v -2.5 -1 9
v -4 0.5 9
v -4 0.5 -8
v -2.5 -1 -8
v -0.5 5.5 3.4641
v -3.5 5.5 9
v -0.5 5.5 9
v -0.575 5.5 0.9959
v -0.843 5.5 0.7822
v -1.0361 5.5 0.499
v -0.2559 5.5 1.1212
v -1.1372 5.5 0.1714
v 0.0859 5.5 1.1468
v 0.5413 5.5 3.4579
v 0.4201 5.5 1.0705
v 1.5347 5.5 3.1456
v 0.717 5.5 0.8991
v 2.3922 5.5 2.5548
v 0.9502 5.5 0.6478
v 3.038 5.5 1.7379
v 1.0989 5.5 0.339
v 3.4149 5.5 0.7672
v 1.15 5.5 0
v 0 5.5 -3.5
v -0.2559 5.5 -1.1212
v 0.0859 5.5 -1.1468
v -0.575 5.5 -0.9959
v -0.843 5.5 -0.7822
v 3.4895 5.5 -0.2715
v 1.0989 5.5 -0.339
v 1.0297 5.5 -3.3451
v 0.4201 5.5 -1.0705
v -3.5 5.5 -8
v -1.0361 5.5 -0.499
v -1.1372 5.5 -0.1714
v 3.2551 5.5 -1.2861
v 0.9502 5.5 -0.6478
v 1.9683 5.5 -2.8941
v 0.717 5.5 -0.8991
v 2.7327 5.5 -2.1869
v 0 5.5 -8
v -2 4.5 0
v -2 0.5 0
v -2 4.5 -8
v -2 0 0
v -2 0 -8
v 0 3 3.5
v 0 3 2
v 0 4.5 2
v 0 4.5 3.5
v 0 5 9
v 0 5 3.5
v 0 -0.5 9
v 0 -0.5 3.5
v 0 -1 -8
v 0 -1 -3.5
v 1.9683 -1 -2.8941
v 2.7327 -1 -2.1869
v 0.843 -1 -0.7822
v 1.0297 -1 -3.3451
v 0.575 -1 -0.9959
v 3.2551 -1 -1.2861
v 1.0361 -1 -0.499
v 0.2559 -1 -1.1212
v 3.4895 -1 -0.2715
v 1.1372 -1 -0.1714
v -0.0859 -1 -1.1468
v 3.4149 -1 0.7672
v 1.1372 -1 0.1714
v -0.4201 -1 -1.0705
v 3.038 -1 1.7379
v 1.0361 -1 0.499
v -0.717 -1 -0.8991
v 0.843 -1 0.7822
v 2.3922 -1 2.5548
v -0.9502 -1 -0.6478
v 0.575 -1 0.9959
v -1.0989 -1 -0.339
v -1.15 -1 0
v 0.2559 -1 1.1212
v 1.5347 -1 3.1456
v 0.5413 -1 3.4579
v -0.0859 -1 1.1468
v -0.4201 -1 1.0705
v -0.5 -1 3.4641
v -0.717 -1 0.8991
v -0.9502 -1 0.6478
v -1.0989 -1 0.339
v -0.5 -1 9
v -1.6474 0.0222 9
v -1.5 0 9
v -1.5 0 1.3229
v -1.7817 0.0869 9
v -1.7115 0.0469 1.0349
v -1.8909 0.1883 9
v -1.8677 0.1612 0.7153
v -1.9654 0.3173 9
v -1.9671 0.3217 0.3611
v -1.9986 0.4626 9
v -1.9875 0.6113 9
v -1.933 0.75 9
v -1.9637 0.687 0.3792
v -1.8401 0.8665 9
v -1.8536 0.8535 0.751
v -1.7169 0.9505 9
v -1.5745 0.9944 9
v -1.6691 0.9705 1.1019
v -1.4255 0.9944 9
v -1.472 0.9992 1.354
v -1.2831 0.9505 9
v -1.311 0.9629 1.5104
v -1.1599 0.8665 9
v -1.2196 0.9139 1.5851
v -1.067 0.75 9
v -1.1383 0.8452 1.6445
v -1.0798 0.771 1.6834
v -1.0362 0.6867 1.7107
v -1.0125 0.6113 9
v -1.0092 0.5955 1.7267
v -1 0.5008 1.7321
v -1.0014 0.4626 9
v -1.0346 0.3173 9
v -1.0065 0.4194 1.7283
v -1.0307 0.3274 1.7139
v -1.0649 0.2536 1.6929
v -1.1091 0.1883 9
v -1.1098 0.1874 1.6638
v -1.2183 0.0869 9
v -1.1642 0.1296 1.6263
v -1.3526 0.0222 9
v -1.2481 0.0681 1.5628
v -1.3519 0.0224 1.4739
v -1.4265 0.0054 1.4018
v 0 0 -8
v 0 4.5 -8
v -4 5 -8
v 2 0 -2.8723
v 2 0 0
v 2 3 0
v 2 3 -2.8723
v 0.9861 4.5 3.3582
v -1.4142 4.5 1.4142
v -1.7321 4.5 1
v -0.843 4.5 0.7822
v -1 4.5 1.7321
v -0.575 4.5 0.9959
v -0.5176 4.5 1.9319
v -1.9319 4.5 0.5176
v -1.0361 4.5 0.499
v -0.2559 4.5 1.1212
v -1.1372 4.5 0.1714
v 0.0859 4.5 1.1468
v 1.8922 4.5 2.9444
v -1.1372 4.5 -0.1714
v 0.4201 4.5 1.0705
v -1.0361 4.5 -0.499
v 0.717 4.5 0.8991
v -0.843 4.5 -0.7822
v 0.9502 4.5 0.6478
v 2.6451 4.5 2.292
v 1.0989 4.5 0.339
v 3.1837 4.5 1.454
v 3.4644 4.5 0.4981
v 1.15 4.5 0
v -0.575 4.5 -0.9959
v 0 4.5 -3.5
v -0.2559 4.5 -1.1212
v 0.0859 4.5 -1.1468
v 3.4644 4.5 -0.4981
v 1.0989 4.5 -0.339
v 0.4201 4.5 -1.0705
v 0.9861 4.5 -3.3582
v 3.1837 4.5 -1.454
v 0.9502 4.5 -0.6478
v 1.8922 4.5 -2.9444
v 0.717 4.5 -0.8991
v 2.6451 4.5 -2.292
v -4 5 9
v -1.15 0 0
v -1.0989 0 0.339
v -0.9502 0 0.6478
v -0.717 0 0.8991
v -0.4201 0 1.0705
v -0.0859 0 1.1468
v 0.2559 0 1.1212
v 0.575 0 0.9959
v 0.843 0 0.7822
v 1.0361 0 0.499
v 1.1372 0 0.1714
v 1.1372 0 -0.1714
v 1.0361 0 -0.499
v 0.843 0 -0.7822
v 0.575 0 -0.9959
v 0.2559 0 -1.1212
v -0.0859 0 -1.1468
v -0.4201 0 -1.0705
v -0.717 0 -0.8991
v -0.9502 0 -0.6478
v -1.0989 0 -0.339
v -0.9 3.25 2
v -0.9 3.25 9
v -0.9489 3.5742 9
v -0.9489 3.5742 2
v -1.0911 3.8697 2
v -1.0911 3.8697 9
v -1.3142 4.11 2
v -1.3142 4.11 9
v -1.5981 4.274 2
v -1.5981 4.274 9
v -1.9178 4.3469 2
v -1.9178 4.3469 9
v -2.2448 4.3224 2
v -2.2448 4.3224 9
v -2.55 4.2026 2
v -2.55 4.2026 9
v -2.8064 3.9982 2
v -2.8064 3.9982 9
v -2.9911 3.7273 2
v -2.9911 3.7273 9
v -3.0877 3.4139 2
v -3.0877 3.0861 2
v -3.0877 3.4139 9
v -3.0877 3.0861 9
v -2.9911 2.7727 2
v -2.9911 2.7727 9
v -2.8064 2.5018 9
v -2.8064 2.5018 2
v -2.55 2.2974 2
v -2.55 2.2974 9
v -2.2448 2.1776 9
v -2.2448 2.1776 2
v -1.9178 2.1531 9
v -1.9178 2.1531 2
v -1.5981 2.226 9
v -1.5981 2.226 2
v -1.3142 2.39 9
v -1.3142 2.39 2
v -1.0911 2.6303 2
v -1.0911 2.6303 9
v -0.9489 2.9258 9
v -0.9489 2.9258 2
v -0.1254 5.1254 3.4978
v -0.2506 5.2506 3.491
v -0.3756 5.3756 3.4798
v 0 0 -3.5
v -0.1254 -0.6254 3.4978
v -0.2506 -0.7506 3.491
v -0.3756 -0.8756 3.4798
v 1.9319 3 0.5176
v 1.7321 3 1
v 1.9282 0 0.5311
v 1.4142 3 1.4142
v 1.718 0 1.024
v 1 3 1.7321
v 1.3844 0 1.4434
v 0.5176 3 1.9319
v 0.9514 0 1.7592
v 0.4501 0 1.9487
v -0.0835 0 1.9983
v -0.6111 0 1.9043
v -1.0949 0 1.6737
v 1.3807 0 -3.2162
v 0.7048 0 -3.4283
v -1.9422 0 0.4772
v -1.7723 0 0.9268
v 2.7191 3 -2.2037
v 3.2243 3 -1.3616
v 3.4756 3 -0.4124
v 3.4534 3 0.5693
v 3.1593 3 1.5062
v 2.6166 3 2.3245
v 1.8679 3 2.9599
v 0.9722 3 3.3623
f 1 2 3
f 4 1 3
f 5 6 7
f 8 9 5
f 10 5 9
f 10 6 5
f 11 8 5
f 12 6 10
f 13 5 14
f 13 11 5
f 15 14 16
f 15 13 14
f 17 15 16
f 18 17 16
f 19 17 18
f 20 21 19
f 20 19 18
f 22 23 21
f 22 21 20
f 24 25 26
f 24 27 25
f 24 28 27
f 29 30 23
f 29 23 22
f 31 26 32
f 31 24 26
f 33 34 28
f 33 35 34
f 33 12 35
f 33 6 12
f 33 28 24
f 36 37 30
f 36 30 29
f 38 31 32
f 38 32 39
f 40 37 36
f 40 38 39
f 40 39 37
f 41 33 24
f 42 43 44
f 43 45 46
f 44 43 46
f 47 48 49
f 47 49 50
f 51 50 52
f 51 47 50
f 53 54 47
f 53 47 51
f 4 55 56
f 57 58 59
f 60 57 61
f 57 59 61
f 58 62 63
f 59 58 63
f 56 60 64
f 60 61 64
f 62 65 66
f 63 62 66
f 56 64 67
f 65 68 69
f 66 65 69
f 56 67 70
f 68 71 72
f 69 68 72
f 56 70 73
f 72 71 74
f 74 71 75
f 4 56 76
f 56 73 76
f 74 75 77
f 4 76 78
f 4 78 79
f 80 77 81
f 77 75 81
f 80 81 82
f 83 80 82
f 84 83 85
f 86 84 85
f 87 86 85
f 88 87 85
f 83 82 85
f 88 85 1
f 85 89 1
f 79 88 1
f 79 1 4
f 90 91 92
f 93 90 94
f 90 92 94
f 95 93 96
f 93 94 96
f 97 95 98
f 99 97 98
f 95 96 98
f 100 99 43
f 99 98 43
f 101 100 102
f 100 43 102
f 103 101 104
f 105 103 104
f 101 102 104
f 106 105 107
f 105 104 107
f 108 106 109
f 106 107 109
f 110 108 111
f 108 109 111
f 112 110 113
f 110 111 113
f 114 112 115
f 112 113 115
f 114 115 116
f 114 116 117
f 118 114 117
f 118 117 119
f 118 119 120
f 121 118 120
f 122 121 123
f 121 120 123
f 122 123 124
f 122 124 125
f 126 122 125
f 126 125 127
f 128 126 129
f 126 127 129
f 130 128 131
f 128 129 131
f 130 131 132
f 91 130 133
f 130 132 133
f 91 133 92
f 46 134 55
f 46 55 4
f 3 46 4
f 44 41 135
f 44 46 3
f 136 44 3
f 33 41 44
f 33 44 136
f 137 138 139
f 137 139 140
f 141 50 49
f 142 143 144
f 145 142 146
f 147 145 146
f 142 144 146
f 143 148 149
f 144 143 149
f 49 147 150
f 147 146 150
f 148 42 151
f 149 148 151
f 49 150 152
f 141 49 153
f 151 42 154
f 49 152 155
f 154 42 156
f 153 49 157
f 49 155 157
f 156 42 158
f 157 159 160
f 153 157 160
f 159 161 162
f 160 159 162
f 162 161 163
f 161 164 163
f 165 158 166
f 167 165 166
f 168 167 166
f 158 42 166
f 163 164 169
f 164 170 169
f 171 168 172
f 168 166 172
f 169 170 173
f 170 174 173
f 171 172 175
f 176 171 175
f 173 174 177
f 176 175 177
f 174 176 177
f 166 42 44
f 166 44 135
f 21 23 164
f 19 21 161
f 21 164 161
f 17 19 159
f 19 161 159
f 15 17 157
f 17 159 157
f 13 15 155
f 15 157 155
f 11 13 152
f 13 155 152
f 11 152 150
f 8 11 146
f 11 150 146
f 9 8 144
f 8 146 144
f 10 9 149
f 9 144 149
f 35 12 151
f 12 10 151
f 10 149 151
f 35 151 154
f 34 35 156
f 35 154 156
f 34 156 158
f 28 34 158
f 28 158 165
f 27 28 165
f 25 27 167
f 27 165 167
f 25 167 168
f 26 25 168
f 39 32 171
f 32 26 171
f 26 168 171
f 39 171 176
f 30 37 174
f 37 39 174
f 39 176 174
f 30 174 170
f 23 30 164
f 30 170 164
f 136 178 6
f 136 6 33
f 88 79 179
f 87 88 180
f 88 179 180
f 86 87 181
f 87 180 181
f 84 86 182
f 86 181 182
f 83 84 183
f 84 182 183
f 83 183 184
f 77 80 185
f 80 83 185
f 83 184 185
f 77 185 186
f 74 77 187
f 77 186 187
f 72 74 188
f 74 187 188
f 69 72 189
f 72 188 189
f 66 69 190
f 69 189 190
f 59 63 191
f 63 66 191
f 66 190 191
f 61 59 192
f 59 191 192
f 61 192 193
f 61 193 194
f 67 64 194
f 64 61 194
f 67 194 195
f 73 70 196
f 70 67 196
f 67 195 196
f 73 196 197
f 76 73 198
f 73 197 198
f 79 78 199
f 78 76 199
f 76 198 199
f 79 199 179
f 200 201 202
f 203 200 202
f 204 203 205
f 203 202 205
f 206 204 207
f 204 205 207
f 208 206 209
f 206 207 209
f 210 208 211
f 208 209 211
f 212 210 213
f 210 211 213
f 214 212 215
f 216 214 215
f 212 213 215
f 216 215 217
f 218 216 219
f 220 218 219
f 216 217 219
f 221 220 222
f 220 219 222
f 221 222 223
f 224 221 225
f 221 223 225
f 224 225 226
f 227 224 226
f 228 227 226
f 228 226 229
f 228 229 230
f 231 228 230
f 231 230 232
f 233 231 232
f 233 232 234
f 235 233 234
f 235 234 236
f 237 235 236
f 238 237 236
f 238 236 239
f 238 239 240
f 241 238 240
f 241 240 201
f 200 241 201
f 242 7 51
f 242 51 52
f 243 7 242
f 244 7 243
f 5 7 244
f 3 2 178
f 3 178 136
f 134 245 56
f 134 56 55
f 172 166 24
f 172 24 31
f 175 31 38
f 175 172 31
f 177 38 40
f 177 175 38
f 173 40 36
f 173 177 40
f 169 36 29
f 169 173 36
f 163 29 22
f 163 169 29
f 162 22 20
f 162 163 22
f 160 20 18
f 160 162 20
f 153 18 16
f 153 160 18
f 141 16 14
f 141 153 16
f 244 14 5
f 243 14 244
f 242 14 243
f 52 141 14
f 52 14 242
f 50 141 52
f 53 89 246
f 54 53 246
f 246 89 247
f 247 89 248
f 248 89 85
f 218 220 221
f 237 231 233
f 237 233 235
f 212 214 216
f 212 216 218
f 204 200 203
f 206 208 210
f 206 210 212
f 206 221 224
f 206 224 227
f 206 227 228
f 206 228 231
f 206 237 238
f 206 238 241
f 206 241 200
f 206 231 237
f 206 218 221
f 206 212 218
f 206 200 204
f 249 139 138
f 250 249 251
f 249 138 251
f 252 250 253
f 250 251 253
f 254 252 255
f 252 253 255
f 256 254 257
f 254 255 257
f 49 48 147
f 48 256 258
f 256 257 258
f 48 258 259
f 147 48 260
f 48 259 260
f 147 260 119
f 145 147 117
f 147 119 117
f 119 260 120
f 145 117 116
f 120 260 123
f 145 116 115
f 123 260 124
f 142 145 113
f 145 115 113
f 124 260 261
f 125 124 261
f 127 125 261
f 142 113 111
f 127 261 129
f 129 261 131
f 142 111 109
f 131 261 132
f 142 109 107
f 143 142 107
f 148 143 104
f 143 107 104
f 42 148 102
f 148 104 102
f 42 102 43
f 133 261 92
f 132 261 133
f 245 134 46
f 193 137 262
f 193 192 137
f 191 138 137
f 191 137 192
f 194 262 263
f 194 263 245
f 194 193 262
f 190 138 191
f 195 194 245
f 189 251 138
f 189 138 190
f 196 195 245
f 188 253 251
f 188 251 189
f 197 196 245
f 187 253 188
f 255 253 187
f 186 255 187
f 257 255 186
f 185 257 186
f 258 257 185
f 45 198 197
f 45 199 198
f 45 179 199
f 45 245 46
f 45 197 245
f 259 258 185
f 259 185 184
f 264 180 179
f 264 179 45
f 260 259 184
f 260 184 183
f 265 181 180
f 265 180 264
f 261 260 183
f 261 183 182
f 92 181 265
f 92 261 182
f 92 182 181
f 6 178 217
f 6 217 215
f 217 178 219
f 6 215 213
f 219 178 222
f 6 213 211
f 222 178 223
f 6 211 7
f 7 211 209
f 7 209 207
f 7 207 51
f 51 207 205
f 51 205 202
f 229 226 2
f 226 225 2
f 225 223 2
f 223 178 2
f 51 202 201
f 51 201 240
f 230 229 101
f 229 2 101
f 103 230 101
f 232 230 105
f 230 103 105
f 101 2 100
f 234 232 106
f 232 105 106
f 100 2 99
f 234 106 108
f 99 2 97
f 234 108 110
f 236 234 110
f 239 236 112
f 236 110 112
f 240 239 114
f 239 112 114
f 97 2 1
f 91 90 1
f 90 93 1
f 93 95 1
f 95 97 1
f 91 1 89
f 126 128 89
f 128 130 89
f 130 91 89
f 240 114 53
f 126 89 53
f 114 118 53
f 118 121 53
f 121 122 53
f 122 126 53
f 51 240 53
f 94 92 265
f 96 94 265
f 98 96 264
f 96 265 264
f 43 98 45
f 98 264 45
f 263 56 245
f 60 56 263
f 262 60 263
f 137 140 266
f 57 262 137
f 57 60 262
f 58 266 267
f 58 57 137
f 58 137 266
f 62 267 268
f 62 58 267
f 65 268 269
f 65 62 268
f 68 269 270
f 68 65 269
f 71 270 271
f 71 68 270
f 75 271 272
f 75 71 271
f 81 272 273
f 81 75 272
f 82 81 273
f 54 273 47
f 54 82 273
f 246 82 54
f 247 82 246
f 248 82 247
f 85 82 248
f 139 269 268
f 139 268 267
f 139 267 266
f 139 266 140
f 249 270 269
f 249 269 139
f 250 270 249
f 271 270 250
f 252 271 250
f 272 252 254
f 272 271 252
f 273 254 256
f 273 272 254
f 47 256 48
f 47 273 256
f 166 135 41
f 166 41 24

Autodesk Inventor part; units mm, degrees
ref_plane "YZ Plane" through (0, 0, 0) normal (1, 0, 0) x (0, 1, 0)
ref_plane "XZ Plane" through (0, 0, 0) normal (0, 1, 0) x (-1, 0, 0)
ref_plane "XY Plane" through (0, 0, 0) normal (0, 0, 1) x (1, 0, 0)
sketch "スケッチ1" plane through (0, 0, 0) normal (0, 1, 0) x (-1, 0, 0)
  circle A0 centre (0, 0) radius 1.15
  circle A1 centre (0, 0) radius 2
  circle A2 centre (0, 0) radius 3.5
  line L0 (0, 0) -> (0, 3.5)
  line L1 (2, 0) -> (-2, 0)
  line L2 (2, 0) -> (2, -2.8723)
  line L3 (-2, 0) -> (-2, -2.8723)
  line L4 (0, 2) -> (3.5, 2)
  line L5 (3.5, 2) -> (3.5, 6)
  line L6 (3.5, 6) -> (0, 6)
  line L7 (0, 6) -> (0, 2)
  line L8 (0, 6) -> (3.5, 6)
  line L9 (3.5, 6) -> (3.5, 0)
  line L10 (3.5, 0) -> (0, 0)
  line L11 (0, 0) -> (0, 6)
  line L12 (0, 0) -> (0, -8)
  line L13 (0, 0) -> (3.5, 0)
  line L14 (3.5, 0) -> (3.5, -8)
  line L15 (3.5, -8) -> (0, -8)
  line L16 (0, -8) -> (0, 0)
  line L17 (2, -2.8723) -> (2, -8)
  line L18 (0, -8) -> (3.5, -4.5)
  line L19 (0, -8) -> (4.9497, -8) construction
  line L20 (0, 0) -> (3.5, 0)
  line L21 (3.5, 0) -> (3.5, -9)
  line L22 (3.5, -9) -> (0, -9)
  line L23 (0, -9) -> (0, 0)
  line L24 (0, 2) -> (4, 2)
  line L25 (4, 2) -> (4, 9)
  line L26 (4, 9) -> (0, 9)
  line L27 (0, 9) -> (0, 2)
  line L28 (0, 9) -> (4, 9)
  line L29 (4, 9) -> (4, -9)
  line L30 (4, -9) -> (0, -9)
  line L31 (0, -9) -> (0, 9)
  line L32 (0, 0) -> (2, 0)
  line L33 (2, 0) -> (2, -9)
  line L34 (2, -9) -> (0, -9)
  line L35 (0, -9) -> (0, 0)
  point P0 (2, -6)
  point P1 (0, -3.5)
  dimension "d0" = 2.3
  dimension "d1" = 4
  dimension "d2" = 7
  dimension "d3" = 3.5
  dimension "d4" = 4
  dimension "d5" = 8
  dimension "d6" = 45
  dimension "d40" = 9
  dimension "d41" = 4
  dimension "d42" = 7
extrude "押し出し1" add sketch "スケッチ1" along normal blind 3 contours A1 L3 A2 L0
extrude "押し出し2" add sketch "スケッチ1" along normal blind 4.5 contours L10 A2 L2 | A1 L4 A2 L10 | L0 A2 L4 | A2 L14 L18 L17 | A2 L4 L9 | L9 L24 L29 L30 L21 L14 | L7 L6 L5 L4 A2 | L18 L14 L15 L17 | L5 L6 L27 L26 L25 L24 | L15 L21 L22 L33
extrude "押し出し3" add sketch "スケッチ1" against normal blind 1 contours L1 A1 L12 A0 | A0 L0 A1 L1 | A0 L1 A1 L0 | L12 A1 L1 A0 | L2 A2 L12 A1 | L10 A2 L2 | A1 L4 A2 L10 | A1 L3 A2 L0 | L0 A2 L4 | L12 A2 L3 A1 | L17 L18 L12 A2 | A2 L14 L18 L17 | A2 L4 L9 | L9 L24 L29 L30 L21 L14 | L7 L6 L5 L4 A2 | L18 L14 L15 L17 | L17 L15 L18 | L5 L6 L27 L26 L25 L24 | L15 L33 L22 L23 | L15 L21 L22 L33
sketch "スケッチ4" plane through (0, 4.5, 0) normal (0, 1, 0) x (1, 0, 0)
  circle A0 centre (0, 0) radius 1.15
  circle A1 centre (0, 0) radius 2
  circle A2 centre (0, 0) radius 3.5
  line L0 (-4, 9) -> (-4, -9) projected
  line L1 (0, 0) -> (-4, 0)
  line L2 (-4, 0) -> (-4, -9)
  line L3 (-4, -9) -> (0, -9)
  line L4 (0, -9) -> (0, 0)
  line L5 (0, 0) -> (-4, 0)
  line L6 (-4, 0) -> (-4, 9)
  line L7 (-4, 9) -> (0, 9)
  line L8 (0, 9) -> (0, 0)
  point P0 (0, -3.5)
  point P1 (0, 3.5)
  dimension "d43" = 2.3
  dimension "d44" = 4
  dimension "d45" = 7
  dimension "d46" = 4
  dimension "d47" = 9
extrude "押し出し6" add sketch "スケッチ4" along normal blind 1 contours A0 L8 A1 L4 | A0 L1 A1 L8 | L4 A1 L1 A0 | L8 A2 L4 A1 | A1 L1 A2 L8 | L4 A2 L1 A1 | A2 L1 L0 L7 L8 | L4 L3 L0 L1 A2
sketch "スケッチ5" plane through (-4, -1, 9) normal (0, 0, 1) x (1, 0, 0)
  line L0 (4, 0) -> (4, 4) projected
  line L1 (4, 0) -> (0, 0)
  line L2 (0, 0) -> (0, 1)
  line L3 (0, 1) -> (4, 1)
  line L4 (4, 1) -> (4, 0)
  line L5 (4, 1) -> (2.5, 1)
  line L6 (2.5, 1) -> (2.5, 1.5)
  line L7 (2.5, 1.5) -> (4, 1.5)
  line L8 (4, 1.5) -> (4, 1)
  line L9 (4, 6.5) -> (0, 6.5) projected
  line L10 (0, 6.5) -> (2, 6.5)
  line L11 (2, 6.5) -> (2, 4.25)
  line L12 (2, 4.25) -> (0, 4.25)
  line L13 (0, 4.25) -> (0, 6.5)
  circle A0 centre (2, 4.25) radius 1.1
  dimension "d50" = 4
  dimension "d51" = 1
  dimension "d52" = 1.5
  dimension "d53" = 0.5
  dimension "d54" = 2
  dimension "d55" = 2.25
  dimension "d56" = 2.2
extrude "押し出し7" cut sketch "スケッチ5" against normal blind 7 contours A0 L12 L11 | L11 L12 A0
hole "穴2" at (-1.5, 0.5, 9) direction (0, 0, -1) diameter 1 end through all
chamfer "面取り1" distance 0.5 angle 45 3 edges at (0, -1, 6.25) (0, 5.5, 6.25) (-4, 5.5, 0)
chamfer "面取り2" distance 1.5 angle 45 1 edges at (-4, -1, 0)
sketch "スケッチ6" plane through (0, 0, -9) normal (0, 0, -1) x (-1, 0, 0)
  line L0 (0, 5.5) -> (4, 5.5)
  line L1 (4, 5.5) -> (4, -1)
  line L2 (4, -1) -> (0, -1)
  line L3 (0, -1) -> (0, 5.5)
  point P0 (0, 0)
  dimension "d72" = 4
  dimension "d73" = 6.5
extrude "押し出し8" cut sketch "スケッチ6" against normal blind 1
properties part number "rod6.2"
